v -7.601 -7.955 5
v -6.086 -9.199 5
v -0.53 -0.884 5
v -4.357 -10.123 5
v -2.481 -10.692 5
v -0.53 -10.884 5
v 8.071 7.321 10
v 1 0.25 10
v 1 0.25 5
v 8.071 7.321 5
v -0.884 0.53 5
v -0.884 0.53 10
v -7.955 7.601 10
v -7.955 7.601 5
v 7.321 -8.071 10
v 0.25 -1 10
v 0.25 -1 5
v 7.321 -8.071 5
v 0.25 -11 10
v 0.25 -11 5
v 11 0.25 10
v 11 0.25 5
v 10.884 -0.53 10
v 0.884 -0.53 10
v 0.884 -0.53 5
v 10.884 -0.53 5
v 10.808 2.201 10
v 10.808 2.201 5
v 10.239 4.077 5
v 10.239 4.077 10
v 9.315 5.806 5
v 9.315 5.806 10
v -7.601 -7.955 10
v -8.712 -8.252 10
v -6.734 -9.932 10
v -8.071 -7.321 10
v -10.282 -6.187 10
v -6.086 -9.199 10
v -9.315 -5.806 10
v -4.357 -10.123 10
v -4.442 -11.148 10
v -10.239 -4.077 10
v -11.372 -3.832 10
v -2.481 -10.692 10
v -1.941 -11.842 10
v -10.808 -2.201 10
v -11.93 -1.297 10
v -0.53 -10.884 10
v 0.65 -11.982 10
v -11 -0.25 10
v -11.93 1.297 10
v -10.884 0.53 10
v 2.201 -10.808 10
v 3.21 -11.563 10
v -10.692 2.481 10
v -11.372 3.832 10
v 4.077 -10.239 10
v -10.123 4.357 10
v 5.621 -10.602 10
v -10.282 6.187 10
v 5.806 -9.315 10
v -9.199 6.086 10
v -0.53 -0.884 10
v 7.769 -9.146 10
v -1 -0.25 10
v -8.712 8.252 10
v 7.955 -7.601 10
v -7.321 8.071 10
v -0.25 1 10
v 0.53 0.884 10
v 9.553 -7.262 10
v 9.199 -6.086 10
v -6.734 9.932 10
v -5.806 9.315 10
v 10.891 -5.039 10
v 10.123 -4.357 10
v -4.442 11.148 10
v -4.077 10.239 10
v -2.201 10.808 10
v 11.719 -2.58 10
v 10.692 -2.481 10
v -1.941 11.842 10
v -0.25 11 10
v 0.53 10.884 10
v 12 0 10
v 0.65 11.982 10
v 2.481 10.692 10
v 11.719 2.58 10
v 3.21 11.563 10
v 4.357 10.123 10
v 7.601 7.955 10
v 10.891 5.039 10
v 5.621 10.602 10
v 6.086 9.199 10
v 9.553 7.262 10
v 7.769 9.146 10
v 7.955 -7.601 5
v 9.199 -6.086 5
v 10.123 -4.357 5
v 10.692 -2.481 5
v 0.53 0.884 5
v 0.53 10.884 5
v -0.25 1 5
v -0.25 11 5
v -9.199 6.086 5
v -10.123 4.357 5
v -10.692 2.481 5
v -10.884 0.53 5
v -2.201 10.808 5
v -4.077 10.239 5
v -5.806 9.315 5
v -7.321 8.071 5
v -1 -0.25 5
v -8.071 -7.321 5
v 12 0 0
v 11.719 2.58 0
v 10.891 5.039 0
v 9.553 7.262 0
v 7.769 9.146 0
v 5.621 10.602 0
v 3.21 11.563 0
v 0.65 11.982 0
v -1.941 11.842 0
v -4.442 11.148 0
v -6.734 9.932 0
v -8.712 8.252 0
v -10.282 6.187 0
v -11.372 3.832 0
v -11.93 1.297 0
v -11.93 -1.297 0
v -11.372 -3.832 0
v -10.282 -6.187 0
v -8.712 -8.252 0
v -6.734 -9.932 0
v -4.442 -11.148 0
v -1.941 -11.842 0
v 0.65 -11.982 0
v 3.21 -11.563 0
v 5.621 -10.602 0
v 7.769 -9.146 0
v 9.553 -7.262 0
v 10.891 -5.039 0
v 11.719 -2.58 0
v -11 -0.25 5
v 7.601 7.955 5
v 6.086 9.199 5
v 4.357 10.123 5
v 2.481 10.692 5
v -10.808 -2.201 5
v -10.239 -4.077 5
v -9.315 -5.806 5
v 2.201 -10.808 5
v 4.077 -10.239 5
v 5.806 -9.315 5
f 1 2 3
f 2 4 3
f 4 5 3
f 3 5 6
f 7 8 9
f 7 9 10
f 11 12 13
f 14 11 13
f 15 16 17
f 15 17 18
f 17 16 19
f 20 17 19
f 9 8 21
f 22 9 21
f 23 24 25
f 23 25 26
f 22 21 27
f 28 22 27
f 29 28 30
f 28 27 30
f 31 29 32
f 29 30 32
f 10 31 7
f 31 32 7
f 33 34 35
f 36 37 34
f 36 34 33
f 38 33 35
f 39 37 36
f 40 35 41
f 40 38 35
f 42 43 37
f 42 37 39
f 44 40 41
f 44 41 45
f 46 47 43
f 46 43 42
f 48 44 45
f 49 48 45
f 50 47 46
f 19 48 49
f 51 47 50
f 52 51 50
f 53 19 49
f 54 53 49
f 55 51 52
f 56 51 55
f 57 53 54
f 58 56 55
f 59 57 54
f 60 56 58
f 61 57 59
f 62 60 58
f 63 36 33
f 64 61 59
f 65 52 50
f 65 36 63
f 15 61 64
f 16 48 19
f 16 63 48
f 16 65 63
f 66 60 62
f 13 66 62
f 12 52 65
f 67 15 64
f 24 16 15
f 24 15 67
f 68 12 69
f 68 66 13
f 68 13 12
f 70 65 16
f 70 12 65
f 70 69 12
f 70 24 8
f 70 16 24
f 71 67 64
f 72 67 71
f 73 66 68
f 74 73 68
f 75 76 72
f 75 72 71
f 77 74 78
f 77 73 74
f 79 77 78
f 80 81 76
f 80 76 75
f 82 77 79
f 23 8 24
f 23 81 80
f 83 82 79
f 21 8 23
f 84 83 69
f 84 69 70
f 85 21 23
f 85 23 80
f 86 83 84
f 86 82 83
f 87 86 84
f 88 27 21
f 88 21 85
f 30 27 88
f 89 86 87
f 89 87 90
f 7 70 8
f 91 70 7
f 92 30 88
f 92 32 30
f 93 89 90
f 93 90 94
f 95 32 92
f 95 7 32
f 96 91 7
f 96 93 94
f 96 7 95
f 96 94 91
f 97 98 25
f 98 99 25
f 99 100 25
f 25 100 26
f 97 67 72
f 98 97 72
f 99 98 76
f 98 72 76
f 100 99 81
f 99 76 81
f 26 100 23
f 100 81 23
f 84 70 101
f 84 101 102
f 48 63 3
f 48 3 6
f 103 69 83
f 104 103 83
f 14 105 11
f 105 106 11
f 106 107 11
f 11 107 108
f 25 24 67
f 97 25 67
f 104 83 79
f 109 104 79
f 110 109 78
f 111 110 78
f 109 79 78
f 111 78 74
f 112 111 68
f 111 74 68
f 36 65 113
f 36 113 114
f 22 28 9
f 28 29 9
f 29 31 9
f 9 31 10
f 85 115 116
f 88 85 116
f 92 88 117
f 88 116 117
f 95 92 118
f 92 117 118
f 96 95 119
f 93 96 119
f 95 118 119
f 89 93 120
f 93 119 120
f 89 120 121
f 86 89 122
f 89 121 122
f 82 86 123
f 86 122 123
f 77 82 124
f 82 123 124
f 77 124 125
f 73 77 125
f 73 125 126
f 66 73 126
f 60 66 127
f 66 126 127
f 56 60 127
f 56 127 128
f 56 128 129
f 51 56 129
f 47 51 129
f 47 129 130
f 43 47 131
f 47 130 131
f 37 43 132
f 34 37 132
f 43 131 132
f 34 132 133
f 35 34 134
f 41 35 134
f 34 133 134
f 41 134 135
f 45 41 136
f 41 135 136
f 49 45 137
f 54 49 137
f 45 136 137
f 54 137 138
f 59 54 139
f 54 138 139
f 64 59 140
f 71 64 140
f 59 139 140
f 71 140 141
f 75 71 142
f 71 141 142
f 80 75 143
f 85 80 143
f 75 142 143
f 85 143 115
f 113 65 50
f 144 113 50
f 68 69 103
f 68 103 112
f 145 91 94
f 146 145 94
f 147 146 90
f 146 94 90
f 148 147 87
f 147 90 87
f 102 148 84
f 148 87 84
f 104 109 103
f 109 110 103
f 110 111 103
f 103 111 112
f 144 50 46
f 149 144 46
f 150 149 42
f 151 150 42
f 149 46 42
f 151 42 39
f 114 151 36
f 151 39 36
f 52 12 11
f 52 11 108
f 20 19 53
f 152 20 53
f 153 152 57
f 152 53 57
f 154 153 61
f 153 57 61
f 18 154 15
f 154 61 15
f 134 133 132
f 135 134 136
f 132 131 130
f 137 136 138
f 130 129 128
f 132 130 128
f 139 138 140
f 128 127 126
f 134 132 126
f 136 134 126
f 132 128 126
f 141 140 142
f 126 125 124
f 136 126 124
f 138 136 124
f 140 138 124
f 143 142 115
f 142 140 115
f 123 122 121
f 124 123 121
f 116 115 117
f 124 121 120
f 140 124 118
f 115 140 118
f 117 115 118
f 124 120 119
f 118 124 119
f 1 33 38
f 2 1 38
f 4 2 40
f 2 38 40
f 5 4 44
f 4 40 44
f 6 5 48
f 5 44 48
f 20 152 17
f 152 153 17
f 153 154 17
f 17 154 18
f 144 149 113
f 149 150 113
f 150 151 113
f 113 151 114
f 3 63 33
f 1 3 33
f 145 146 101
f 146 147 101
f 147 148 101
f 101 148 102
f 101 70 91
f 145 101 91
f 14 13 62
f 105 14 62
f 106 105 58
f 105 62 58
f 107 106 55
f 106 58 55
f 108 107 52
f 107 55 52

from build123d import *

# Parameters (mm, degrees)
CYLINDER001_W     = 10
CYLINDER001_H     = 10
CYLINDER001_ANGLE = 45
ARRAY_COUNT       = 8
CYLINDER_R        = 12
CYLINDER_DEPTH    = 10


with BuildPart() as array:
    # Cylinder001 → Cylinder001 (revolve)
    with BuildSketch(Plane(origin=(1, 0.25, 0), x_dir=(1, 0, 0), z_dir=(0, -1, 0))):
        with Locations((5, 5)):
            Rectangle(CYLINDER001_W, CYLINDER001_H)
    revolve(axis=Axis((1, 0.25, 0), (0, 0, 1)), revolution_arc=CYLINDER001_ANGLE)

    # Array: Array ×8 about axis
    array_axis = Axis((0, 0, 0), (0, 0, 1))


with BuildPart() as array_1:
    add(array.part)
    for i in range(1, ARRAY_COUNT):
        add(array.part.rotate(array_axis, i * 360 / ARRAY_COUNT))


with BuildPart() as array_2:
    # Array placement: moved
    add(array_1.part.moved(Location((0, 0, 5))))


with BuildPart() as cut:
    # Cylinder → Cylinder (new body)
    with BuildSketch(Plane.XY):
        Circle(CYLINDER_R)
    extrude(amount=CYLINDER_DEPTH)

    # Cut: cut Array
    add(array_2.part, mode=Mode.SUBTRACT)


solid = cut.part
